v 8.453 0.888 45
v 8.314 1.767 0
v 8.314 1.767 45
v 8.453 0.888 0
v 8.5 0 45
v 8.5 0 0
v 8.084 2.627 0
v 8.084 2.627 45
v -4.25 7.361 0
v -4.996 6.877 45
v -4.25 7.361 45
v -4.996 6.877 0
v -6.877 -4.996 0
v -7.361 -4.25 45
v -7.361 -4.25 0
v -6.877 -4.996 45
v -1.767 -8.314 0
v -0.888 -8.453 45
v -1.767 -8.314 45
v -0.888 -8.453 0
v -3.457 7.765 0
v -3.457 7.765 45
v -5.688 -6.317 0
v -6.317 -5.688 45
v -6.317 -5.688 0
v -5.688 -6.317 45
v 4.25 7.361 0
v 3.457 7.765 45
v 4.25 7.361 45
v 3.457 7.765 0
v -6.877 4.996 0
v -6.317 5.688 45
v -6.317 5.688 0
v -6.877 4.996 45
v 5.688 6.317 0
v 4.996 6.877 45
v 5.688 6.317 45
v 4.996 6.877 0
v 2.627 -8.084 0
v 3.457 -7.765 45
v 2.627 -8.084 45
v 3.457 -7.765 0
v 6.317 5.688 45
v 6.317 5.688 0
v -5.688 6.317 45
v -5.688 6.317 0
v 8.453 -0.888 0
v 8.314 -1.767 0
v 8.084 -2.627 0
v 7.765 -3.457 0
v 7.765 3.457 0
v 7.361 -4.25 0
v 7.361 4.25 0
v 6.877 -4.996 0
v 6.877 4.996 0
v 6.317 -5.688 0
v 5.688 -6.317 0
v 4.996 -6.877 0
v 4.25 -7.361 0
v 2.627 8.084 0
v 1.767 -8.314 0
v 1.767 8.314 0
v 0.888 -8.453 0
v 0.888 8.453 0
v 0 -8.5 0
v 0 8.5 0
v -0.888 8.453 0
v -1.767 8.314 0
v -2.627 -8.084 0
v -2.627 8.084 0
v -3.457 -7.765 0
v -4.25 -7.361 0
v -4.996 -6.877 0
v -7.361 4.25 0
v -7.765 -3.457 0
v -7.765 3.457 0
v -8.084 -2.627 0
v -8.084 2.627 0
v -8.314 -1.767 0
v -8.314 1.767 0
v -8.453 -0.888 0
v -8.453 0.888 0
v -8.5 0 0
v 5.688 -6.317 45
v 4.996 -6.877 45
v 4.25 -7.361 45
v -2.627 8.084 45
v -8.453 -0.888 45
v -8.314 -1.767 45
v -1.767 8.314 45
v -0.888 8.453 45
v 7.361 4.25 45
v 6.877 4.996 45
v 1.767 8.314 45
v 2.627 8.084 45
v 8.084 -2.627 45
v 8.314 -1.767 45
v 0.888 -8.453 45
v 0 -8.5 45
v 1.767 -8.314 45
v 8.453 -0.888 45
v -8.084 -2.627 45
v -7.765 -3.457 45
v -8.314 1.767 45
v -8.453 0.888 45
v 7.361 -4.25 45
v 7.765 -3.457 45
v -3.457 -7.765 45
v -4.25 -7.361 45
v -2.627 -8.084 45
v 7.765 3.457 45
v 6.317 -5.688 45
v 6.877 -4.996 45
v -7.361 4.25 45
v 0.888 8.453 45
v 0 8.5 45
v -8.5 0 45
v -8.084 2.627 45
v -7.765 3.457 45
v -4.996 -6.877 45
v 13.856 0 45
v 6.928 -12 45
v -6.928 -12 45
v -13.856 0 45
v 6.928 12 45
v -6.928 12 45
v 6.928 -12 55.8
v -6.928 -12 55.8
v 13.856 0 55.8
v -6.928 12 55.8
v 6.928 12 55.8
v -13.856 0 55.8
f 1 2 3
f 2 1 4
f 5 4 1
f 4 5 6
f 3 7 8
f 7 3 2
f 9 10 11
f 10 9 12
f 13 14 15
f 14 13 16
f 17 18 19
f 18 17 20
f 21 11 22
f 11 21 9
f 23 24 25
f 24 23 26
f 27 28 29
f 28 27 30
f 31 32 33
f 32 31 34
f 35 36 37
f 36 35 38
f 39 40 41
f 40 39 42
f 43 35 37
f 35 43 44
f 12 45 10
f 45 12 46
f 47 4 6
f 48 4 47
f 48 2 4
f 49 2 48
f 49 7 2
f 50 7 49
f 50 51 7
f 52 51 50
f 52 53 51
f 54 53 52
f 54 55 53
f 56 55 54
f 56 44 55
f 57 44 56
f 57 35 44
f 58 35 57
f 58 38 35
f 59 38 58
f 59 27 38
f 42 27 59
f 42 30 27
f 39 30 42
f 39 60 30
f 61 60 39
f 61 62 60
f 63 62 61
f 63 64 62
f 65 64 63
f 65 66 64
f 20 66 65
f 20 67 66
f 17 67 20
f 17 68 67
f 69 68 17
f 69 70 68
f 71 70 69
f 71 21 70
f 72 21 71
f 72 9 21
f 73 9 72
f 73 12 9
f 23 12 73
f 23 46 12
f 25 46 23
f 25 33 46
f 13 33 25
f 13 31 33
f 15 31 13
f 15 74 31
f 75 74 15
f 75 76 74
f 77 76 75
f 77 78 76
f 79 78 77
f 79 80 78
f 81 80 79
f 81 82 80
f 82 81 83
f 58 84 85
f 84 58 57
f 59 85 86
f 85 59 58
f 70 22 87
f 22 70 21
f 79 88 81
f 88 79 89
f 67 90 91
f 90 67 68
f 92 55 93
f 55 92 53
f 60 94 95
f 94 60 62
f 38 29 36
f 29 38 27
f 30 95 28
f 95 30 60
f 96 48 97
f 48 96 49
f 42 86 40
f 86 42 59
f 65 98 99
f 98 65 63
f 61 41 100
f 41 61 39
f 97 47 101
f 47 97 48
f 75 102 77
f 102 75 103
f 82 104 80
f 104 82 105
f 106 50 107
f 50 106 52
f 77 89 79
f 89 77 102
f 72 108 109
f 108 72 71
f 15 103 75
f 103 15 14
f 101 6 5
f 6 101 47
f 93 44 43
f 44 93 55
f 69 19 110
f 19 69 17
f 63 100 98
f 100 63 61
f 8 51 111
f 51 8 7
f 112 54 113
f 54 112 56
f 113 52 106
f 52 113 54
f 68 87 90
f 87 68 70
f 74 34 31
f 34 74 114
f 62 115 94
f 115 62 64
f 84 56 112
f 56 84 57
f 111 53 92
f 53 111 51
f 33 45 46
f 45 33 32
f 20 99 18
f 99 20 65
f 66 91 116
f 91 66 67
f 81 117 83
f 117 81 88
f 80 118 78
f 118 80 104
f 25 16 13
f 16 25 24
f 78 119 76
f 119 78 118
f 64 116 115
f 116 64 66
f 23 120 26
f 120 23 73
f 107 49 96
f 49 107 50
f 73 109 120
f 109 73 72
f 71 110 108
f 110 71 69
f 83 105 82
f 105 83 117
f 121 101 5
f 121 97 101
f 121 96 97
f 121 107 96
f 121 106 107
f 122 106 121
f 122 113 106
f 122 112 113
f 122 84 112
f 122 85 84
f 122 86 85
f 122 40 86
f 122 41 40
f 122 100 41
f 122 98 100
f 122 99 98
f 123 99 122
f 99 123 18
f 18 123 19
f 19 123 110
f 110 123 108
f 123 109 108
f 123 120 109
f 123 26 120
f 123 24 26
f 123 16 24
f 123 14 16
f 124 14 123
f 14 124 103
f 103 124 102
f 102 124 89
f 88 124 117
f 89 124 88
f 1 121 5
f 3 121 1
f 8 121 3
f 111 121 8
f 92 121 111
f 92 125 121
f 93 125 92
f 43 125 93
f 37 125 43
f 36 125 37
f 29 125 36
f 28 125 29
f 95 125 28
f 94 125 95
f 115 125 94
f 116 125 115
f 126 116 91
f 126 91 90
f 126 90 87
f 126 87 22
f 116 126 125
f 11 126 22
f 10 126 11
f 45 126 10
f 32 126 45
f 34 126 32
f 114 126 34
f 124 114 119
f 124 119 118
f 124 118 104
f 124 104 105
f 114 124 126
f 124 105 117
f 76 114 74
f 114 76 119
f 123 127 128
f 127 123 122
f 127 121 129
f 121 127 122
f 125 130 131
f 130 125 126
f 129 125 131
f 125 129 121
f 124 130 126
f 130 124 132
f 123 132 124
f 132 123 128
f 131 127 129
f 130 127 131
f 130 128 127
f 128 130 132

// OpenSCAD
// Hex-head bolt.
$fn = 60;
eps = 0.02;
thread_d = 17;
flat = 24;
shaft_l = 45;
union() { cylinder(d=thread_d,h=shaft_l); translate([0,0,shaft_l]) cylinder(d=flat/cos(30),h=flat*0.45,$fn=6); }
